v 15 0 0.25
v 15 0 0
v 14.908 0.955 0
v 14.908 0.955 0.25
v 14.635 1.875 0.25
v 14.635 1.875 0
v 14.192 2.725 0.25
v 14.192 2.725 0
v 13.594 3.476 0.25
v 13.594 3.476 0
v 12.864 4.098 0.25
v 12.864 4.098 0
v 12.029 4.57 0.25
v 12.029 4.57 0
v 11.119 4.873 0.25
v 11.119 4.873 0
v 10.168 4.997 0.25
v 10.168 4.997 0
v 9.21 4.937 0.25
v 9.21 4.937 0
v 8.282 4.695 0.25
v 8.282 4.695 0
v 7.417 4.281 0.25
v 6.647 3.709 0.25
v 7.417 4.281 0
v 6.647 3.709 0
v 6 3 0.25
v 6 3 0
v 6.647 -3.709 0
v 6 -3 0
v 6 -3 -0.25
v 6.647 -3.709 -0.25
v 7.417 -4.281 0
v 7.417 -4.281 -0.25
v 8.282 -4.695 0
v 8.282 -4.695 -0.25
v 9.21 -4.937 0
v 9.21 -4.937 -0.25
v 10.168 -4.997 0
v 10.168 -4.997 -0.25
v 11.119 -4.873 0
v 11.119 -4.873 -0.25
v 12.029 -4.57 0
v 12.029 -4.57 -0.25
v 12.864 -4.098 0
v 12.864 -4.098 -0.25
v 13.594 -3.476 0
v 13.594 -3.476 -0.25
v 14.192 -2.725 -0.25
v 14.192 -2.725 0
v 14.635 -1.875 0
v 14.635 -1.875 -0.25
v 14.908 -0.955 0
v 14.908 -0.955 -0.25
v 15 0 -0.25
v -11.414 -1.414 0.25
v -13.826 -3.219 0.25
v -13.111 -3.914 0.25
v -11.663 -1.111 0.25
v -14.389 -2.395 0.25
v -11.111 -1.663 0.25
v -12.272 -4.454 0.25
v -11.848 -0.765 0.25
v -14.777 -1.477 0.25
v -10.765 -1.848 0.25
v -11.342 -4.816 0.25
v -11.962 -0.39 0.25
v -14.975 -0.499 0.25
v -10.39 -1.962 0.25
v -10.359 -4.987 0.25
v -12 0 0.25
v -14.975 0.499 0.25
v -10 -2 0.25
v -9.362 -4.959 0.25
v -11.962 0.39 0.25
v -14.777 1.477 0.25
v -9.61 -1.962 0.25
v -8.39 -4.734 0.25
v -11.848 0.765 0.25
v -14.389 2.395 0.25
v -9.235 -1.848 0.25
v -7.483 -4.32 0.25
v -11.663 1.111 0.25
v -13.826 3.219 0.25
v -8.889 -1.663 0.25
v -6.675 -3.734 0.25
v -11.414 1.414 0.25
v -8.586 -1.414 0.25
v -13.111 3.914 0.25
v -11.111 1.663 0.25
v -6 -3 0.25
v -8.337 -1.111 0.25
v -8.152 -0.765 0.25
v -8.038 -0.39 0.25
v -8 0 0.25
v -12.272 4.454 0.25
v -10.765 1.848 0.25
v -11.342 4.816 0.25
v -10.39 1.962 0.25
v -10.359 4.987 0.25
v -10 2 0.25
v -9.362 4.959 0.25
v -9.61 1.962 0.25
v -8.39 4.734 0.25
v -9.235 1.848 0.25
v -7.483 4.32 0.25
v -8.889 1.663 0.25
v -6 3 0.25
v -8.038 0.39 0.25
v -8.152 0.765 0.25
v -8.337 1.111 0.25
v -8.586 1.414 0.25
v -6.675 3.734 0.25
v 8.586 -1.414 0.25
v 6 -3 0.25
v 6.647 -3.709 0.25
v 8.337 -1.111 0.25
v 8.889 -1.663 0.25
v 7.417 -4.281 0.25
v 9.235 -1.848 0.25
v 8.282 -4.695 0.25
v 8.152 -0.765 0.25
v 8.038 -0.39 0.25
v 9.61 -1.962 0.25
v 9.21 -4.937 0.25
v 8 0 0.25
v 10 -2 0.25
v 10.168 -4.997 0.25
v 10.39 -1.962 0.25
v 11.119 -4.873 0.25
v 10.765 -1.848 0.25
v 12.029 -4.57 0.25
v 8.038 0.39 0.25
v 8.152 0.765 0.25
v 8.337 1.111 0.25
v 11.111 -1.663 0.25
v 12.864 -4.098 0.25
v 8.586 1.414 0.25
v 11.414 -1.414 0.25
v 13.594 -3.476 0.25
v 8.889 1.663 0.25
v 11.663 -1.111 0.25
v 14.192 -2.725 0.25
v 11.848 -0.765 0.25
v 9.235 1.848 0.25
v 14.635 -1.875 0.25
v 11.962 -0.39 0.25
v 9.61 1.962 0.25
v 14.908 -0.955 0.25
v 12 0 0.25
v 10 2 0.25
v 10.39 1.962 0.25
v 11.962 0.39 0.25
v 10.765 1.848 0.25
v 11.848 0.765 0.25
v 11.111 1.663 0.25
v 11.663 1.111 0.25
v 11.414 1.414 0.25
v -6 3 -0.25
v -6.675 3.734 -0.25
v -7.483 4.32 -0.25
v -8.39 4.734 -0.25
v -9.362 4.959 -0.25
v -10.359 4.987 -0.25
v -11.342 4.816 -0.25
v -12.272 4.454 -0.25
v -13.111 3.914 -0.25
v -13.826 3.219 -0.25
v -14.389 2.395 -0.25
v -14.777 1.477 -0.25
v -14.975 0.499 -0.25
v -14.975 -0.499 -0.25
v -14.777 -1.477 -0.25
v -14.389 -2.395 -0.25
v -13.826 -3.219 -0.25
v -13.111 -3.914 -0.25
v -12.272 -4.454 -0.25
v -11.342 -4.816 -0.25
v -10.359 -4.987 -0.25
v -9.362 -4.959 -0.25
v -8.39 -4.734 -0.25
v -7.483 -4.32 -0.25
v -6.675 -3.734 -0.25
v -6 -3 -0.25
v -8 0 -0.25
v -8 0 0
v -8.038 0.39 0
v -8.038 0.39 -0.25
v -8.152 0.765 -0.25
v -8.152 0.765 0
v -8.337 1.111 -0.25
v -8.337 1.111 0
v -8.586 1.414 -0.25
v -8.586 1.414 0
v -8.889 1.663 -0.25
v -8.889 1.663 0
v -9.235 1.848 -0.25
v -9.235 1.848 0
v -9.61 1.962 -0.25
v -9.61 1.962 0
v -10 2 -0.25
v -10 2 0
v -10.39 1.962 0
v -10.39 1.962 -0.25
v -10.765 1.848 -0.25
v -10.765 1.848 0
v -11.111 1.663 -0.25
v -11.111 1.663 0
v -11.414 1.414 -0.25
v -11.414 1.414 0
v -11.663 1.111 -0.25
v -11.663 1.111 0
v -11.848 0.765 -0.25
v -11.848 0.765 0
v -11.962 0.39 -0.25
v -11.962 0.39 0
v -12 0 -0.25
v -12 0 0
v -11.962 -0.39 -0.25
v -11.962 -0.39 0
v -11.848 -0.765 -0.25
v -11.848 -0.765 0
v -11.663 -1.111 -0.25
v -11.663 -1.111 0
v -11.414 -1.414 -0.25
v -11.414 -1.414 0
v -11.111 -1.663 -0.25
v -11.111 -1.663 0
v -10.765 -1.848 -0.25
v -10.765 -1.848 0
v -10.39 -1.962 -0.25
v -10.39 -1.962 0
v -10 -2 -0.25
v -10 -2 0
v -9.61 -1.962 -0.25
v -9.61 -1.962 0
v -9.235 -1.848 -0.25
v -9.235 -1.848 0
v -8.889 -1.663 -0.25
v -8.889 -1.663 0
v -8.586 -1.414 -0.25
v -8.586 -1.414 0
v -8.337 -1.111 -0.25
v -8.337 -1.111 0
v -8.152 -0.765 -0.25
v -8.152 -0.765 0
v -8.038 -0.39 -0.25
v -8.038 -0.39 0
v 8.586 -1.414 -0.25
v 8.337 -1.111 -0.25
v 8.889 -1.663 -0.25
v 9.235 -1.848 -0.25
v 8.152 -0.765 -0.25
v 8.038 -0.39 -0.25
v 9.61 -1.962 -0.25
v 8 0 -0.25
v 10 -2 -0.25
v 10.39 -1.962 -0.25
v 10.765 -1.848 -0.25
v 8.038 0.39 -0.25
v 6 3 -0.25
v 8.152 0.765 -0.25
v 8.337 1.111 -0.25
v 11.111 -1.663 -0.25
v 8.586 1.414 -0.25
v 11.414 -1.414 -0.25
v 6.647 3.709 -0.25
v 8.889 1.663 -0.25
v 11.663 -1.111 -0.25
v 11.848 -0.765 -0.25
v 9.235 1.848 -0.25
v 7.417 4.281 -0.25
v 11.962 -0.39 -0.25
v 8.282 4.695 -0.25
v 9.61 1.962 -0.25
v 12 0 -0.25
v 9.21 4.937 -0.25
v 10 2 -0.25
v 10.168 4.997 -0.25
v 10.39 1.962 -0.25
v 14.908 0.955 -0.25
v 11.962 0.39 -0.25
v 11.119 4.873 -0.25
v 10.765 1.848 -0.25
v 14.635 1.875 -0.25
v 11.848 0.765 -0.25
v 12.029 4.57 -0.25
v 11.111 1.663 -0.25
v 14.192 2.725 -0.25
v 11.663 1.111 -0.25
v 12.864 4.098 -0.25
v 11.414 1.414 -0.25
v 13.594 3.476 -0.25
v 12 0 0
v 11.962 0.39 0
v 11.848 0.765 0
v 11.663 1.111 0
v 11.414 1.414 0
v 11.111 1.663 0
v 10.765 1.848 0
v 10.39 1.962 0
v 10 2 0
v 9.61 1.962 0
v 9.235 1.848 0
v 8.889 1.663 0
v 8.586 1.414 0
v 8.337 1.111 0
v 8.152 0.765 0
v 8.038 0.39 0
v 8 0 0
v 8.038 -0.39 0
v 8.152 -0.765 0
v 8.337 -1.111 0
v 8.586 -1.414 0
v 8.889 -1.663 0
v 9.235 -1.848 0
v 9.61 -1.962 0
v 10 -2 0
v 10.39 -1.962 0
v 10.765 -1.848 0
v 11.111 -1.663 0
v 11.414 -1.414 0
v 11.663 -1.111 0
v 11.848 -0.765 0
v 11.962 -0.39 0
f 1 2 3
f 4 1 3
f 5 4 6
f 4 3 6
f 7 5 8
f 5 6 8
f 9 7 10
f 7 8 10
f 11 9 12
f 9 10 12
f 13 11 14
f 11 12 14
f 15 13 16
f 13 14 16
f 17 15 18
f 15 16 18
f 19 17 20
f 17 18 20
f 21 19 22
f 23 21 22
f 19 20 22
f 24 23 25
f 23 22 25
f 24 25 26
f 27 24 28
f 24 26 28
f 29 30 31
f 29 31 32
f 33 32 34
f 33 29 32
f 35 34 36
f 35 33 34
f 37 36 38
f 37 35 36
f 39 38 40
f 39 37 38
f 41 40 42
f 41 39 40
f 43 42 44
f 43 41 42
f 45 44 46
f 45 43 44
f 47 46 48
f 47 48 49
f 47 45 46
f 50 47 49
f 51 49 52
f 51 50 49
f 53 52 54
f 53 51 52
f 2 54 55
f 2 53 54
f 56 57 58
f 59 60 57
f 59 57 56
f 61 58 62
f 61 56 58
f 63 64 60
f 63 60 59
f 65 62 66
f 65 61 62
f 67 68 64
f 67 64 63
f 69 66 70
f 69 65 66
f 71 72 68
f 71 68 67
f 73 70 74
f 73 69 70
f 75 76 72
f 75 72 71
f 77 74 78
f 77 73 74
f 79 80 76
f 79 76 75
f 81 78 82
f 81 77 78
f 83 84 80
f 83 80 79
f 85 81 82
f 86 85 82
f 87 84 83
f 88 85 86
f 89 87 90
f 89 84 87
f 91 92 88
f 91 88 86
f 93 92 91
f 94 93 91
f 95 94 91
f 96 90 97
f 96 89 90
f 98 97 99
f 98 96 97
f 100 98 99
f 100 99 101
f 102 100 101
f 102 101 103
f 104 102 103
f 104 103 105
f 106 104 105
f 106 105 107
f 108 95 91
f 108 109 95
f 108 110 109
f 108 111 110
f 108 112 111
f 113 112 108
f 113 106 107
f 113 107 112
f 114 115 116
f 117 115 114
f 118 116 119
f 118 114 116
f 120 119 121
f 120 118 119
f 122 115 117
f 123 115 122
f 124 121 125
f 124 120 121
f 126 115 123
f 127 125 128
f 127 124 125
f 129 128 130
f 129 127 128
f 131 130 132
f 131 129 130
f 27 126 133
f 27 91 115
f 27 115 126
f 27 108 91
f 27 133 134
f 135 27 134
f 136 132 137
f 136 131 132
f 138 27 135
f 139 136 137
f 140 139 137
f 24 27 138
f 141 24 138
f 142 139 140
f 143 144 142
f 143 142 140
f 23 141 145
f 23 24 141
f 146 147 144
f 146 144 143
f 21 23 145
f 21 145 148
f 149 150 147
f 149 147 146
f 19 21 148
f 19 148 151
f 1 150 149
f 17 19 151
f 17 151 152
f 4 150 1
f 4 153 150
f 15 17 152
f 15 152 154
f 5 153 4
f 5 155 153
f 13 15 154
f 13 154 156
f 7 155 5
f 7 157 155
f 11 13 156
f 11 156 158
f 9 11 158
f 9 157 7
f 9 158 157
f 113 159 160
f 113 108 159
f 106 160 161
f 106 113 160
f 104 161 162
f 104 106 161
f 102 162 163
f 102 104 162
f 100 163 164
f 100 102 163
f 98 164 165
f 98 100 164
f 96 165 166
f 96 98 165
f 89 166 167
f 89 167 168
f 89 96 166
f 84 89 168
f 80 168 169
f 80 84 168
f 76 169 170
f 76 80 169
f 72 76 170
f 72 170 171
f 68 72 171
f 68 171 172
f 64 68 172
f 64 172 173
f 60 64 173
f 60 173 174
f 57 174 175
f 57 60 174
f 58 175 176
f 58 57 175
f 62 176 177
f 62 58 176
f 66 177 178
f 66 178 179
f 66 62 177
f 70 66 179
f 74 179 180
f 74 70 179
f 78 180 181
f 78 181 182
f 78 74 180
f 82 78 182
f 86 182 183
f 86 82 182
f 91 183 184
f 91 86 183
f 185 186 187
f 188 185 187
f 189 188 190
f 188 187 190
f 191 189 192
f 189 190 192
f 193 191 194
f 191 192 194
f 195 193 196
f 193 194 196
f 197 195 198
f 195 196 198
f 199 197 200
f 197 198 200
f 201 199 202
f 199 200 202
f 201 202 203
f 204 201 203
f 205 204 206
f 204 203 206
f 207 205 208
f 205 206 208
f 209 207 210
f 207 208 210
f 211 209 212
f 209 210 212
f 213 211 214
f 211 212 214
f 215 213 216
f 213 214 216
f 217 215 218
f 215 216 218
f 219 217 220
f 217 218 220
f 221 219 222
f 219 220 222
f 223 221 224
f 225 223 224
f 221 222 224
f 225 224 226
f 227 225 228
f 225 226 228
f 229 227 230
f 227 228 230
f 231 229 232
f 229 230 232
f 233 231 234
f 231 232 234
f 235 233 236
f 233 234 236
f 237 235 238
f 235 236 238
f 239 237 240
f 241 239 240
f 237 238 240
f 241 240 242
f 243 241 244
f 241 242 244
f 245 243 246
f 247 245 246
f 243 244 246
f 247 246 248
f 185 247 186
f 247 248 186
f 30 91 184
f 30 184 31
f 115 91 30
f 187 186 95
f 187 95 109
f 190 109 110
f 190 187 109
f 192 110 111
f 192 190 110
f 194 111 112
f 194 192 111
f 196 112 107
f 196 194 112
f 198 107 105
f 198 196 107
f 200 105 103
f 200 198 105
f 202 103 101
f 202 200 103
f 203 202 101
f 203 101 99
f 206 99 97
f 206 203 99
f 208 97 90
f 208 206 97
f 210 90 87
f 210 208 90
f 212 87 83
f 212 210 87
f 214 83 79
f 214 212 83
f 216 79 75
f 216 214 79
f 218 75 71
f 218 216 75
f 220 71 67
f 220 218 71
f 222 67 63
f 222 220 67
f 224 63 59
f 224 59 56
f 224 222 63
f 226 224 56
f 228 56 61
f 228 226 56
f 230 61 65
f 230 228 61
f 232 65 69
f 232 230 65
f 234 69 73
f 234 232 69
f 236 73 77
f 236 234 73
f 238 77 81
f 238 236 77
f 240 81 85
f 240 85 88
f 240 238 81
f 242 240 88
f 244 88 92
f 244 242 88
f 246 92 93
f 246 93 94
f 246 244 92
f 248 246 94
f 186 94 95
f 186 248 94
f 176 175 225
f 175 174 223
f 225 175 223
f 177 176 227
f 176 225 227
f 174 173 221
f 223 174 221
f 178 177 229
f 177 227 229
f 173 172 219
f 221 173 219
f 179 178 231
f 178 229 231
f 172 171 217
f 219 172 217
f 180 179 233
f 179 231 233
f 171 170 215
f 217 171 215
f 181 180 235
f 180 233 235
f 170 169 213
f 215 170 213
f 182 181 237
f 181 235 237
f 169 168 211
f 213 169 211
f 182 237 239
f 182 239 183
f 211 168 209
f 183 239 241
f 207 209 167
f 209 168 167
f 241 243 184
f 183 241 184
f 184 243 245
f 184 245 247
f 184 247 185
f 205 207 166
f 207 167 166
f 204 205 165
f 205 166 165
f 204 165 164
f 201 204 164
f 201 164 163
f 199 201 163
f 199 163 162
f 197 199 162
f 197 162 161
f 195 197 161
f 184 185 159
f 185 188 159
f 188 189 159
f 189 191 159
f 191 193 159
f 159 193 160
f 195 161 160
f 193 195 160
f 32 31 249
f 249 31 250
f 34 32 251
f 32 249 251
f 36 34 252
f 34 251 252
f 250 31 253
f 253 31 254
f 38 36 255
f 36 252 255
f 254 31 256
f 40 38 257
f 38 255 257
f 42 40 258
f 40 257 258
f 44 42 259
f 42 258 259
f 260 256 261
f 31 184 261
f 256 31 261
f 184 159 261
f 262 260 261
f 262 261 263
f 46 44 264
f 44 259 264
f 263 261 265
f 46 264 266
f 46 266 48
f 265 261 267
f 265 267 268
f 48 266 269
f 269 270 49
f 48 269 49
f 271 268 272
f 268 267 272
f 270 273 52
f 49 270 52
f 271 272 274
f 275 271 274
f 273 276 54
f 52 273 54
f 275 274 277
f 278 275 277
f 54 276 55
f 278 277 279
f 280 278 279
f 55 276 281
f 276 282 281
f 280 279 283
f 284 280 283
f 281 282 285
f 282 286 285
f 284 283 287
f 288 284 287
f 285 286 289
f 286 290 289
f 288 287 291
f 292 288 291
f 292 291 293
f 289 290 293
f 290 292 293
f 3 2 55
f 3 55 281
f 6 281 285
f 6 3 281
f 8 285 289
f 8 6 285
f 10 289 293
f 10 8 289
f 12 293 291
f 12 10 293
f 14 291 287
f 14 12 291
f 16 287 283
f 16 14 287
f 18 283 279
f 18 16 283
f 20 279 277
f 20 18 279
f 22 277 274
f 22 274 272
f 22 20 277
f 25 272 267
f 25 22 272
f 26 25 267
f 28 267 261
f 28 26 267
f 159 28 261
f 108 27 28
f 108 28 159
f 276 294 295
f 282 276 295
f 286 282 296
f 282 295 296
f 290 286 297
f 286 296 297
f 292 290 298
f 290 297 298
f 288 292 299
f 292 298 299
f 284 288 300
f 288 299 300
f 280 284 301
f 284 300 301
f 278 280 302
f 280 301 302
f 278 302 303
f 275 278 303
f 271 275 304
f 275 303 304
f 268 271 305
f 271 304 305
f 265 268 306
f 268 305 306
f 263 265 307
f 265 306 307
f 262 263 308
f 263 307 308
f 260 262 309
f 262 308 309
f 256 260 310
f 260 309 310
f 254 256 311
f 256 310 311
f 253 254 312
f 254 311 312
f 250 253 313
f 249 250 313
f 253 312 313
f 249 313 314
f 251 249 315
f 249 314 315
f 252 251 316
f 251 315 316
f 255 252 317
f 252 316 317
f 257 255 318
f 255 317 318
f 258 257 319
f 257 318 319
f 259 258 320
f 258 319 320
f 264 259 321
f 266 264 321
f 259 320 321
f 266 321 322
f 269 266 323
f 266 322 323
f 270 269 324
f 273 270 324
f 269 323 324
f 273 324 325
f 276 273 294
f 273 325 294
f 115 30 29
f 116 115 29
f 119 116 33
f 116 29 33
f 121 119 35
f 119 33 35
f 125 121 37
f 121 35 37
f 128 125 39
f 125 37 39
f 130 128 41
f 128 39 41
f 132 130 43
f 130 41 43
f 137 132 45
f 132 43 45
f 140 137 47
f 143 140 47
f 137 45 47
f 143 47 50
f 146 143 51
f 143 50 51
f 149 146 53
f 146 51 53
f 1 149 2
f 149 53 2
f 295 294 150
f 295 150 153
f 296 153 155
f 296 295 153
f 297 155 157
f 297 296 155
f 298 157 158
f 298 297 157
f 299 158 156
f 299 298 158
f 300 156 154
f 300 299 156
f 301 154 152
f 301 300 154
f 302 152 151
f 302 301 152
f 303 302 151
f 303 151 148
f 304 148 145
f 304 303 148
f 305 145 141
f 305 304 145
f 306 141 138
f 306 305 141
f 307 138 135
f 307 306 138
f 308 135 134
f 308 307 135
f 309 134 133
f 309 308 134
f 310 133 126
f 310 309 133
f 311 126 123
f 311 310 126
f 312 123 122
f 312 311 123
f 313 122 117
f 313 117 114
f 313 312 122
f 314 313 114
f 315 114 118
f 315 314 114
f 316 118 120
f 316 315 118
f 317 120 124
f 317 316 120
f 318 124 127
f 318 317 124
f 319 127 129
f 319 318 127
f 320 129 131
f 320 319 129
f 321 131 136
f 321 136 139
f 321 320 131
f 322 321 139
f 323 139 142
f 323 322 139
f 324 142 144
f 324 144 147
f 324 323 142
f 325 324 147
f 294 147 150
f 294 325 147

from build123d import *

# Parameters (mm, degrees)
F0_R     = 2
F1_DEPTH = 0.25


with BuildPart() as f1:
    # F0 (on Top) → F1 (new body, symmetric)
    with BuildSketch(Plane.XY):
        with BuildLine():
            ThreePointArc((-6, -3), (-5.2565835097, -1.5811388301), (-5, 0))
            ThreePointArc((-5, 0), (-5.2565835097, 1.5811388301), (-6, 3))
            ThreePointArc((-6, 3), (-15, 0), (-6, -3))
        make_face()
        with Locations((-10, 0)):
            Circle(F0_R, mode=Mode.SUBTRACT)
        with BuildLine():
            ThreePointArc((15, 0), (11.5811388301, 4.7434164903), (6, 3))
            ThreePointArc((6, 3), (5, 0), (6, -3))
            ThreePointArc((6, -3), (11.5811388301, -4.7434164903), (15, 0))
        make_face()
        with Locations((10, 0)):
            Circle(F0_R, mode=Mode.SUBTRACT)
        with BuildLine():
            ThreePointArc((-6, 3), (-5.2565835097, 1.5811388301), (-5, 0))
            ThreePointArc((-5, 0), (-5.2565835097, -1.5811388301), (-6, -3))
            Line((-6, -3), (6, -3))
            ThreePointArc((6, -3), (5, 0), (6, 3))
            Line((6, 3), (-6, 3))
        make_face()
    extrude(amount=F1_DEPTH, both=True)


solid = f1.part
